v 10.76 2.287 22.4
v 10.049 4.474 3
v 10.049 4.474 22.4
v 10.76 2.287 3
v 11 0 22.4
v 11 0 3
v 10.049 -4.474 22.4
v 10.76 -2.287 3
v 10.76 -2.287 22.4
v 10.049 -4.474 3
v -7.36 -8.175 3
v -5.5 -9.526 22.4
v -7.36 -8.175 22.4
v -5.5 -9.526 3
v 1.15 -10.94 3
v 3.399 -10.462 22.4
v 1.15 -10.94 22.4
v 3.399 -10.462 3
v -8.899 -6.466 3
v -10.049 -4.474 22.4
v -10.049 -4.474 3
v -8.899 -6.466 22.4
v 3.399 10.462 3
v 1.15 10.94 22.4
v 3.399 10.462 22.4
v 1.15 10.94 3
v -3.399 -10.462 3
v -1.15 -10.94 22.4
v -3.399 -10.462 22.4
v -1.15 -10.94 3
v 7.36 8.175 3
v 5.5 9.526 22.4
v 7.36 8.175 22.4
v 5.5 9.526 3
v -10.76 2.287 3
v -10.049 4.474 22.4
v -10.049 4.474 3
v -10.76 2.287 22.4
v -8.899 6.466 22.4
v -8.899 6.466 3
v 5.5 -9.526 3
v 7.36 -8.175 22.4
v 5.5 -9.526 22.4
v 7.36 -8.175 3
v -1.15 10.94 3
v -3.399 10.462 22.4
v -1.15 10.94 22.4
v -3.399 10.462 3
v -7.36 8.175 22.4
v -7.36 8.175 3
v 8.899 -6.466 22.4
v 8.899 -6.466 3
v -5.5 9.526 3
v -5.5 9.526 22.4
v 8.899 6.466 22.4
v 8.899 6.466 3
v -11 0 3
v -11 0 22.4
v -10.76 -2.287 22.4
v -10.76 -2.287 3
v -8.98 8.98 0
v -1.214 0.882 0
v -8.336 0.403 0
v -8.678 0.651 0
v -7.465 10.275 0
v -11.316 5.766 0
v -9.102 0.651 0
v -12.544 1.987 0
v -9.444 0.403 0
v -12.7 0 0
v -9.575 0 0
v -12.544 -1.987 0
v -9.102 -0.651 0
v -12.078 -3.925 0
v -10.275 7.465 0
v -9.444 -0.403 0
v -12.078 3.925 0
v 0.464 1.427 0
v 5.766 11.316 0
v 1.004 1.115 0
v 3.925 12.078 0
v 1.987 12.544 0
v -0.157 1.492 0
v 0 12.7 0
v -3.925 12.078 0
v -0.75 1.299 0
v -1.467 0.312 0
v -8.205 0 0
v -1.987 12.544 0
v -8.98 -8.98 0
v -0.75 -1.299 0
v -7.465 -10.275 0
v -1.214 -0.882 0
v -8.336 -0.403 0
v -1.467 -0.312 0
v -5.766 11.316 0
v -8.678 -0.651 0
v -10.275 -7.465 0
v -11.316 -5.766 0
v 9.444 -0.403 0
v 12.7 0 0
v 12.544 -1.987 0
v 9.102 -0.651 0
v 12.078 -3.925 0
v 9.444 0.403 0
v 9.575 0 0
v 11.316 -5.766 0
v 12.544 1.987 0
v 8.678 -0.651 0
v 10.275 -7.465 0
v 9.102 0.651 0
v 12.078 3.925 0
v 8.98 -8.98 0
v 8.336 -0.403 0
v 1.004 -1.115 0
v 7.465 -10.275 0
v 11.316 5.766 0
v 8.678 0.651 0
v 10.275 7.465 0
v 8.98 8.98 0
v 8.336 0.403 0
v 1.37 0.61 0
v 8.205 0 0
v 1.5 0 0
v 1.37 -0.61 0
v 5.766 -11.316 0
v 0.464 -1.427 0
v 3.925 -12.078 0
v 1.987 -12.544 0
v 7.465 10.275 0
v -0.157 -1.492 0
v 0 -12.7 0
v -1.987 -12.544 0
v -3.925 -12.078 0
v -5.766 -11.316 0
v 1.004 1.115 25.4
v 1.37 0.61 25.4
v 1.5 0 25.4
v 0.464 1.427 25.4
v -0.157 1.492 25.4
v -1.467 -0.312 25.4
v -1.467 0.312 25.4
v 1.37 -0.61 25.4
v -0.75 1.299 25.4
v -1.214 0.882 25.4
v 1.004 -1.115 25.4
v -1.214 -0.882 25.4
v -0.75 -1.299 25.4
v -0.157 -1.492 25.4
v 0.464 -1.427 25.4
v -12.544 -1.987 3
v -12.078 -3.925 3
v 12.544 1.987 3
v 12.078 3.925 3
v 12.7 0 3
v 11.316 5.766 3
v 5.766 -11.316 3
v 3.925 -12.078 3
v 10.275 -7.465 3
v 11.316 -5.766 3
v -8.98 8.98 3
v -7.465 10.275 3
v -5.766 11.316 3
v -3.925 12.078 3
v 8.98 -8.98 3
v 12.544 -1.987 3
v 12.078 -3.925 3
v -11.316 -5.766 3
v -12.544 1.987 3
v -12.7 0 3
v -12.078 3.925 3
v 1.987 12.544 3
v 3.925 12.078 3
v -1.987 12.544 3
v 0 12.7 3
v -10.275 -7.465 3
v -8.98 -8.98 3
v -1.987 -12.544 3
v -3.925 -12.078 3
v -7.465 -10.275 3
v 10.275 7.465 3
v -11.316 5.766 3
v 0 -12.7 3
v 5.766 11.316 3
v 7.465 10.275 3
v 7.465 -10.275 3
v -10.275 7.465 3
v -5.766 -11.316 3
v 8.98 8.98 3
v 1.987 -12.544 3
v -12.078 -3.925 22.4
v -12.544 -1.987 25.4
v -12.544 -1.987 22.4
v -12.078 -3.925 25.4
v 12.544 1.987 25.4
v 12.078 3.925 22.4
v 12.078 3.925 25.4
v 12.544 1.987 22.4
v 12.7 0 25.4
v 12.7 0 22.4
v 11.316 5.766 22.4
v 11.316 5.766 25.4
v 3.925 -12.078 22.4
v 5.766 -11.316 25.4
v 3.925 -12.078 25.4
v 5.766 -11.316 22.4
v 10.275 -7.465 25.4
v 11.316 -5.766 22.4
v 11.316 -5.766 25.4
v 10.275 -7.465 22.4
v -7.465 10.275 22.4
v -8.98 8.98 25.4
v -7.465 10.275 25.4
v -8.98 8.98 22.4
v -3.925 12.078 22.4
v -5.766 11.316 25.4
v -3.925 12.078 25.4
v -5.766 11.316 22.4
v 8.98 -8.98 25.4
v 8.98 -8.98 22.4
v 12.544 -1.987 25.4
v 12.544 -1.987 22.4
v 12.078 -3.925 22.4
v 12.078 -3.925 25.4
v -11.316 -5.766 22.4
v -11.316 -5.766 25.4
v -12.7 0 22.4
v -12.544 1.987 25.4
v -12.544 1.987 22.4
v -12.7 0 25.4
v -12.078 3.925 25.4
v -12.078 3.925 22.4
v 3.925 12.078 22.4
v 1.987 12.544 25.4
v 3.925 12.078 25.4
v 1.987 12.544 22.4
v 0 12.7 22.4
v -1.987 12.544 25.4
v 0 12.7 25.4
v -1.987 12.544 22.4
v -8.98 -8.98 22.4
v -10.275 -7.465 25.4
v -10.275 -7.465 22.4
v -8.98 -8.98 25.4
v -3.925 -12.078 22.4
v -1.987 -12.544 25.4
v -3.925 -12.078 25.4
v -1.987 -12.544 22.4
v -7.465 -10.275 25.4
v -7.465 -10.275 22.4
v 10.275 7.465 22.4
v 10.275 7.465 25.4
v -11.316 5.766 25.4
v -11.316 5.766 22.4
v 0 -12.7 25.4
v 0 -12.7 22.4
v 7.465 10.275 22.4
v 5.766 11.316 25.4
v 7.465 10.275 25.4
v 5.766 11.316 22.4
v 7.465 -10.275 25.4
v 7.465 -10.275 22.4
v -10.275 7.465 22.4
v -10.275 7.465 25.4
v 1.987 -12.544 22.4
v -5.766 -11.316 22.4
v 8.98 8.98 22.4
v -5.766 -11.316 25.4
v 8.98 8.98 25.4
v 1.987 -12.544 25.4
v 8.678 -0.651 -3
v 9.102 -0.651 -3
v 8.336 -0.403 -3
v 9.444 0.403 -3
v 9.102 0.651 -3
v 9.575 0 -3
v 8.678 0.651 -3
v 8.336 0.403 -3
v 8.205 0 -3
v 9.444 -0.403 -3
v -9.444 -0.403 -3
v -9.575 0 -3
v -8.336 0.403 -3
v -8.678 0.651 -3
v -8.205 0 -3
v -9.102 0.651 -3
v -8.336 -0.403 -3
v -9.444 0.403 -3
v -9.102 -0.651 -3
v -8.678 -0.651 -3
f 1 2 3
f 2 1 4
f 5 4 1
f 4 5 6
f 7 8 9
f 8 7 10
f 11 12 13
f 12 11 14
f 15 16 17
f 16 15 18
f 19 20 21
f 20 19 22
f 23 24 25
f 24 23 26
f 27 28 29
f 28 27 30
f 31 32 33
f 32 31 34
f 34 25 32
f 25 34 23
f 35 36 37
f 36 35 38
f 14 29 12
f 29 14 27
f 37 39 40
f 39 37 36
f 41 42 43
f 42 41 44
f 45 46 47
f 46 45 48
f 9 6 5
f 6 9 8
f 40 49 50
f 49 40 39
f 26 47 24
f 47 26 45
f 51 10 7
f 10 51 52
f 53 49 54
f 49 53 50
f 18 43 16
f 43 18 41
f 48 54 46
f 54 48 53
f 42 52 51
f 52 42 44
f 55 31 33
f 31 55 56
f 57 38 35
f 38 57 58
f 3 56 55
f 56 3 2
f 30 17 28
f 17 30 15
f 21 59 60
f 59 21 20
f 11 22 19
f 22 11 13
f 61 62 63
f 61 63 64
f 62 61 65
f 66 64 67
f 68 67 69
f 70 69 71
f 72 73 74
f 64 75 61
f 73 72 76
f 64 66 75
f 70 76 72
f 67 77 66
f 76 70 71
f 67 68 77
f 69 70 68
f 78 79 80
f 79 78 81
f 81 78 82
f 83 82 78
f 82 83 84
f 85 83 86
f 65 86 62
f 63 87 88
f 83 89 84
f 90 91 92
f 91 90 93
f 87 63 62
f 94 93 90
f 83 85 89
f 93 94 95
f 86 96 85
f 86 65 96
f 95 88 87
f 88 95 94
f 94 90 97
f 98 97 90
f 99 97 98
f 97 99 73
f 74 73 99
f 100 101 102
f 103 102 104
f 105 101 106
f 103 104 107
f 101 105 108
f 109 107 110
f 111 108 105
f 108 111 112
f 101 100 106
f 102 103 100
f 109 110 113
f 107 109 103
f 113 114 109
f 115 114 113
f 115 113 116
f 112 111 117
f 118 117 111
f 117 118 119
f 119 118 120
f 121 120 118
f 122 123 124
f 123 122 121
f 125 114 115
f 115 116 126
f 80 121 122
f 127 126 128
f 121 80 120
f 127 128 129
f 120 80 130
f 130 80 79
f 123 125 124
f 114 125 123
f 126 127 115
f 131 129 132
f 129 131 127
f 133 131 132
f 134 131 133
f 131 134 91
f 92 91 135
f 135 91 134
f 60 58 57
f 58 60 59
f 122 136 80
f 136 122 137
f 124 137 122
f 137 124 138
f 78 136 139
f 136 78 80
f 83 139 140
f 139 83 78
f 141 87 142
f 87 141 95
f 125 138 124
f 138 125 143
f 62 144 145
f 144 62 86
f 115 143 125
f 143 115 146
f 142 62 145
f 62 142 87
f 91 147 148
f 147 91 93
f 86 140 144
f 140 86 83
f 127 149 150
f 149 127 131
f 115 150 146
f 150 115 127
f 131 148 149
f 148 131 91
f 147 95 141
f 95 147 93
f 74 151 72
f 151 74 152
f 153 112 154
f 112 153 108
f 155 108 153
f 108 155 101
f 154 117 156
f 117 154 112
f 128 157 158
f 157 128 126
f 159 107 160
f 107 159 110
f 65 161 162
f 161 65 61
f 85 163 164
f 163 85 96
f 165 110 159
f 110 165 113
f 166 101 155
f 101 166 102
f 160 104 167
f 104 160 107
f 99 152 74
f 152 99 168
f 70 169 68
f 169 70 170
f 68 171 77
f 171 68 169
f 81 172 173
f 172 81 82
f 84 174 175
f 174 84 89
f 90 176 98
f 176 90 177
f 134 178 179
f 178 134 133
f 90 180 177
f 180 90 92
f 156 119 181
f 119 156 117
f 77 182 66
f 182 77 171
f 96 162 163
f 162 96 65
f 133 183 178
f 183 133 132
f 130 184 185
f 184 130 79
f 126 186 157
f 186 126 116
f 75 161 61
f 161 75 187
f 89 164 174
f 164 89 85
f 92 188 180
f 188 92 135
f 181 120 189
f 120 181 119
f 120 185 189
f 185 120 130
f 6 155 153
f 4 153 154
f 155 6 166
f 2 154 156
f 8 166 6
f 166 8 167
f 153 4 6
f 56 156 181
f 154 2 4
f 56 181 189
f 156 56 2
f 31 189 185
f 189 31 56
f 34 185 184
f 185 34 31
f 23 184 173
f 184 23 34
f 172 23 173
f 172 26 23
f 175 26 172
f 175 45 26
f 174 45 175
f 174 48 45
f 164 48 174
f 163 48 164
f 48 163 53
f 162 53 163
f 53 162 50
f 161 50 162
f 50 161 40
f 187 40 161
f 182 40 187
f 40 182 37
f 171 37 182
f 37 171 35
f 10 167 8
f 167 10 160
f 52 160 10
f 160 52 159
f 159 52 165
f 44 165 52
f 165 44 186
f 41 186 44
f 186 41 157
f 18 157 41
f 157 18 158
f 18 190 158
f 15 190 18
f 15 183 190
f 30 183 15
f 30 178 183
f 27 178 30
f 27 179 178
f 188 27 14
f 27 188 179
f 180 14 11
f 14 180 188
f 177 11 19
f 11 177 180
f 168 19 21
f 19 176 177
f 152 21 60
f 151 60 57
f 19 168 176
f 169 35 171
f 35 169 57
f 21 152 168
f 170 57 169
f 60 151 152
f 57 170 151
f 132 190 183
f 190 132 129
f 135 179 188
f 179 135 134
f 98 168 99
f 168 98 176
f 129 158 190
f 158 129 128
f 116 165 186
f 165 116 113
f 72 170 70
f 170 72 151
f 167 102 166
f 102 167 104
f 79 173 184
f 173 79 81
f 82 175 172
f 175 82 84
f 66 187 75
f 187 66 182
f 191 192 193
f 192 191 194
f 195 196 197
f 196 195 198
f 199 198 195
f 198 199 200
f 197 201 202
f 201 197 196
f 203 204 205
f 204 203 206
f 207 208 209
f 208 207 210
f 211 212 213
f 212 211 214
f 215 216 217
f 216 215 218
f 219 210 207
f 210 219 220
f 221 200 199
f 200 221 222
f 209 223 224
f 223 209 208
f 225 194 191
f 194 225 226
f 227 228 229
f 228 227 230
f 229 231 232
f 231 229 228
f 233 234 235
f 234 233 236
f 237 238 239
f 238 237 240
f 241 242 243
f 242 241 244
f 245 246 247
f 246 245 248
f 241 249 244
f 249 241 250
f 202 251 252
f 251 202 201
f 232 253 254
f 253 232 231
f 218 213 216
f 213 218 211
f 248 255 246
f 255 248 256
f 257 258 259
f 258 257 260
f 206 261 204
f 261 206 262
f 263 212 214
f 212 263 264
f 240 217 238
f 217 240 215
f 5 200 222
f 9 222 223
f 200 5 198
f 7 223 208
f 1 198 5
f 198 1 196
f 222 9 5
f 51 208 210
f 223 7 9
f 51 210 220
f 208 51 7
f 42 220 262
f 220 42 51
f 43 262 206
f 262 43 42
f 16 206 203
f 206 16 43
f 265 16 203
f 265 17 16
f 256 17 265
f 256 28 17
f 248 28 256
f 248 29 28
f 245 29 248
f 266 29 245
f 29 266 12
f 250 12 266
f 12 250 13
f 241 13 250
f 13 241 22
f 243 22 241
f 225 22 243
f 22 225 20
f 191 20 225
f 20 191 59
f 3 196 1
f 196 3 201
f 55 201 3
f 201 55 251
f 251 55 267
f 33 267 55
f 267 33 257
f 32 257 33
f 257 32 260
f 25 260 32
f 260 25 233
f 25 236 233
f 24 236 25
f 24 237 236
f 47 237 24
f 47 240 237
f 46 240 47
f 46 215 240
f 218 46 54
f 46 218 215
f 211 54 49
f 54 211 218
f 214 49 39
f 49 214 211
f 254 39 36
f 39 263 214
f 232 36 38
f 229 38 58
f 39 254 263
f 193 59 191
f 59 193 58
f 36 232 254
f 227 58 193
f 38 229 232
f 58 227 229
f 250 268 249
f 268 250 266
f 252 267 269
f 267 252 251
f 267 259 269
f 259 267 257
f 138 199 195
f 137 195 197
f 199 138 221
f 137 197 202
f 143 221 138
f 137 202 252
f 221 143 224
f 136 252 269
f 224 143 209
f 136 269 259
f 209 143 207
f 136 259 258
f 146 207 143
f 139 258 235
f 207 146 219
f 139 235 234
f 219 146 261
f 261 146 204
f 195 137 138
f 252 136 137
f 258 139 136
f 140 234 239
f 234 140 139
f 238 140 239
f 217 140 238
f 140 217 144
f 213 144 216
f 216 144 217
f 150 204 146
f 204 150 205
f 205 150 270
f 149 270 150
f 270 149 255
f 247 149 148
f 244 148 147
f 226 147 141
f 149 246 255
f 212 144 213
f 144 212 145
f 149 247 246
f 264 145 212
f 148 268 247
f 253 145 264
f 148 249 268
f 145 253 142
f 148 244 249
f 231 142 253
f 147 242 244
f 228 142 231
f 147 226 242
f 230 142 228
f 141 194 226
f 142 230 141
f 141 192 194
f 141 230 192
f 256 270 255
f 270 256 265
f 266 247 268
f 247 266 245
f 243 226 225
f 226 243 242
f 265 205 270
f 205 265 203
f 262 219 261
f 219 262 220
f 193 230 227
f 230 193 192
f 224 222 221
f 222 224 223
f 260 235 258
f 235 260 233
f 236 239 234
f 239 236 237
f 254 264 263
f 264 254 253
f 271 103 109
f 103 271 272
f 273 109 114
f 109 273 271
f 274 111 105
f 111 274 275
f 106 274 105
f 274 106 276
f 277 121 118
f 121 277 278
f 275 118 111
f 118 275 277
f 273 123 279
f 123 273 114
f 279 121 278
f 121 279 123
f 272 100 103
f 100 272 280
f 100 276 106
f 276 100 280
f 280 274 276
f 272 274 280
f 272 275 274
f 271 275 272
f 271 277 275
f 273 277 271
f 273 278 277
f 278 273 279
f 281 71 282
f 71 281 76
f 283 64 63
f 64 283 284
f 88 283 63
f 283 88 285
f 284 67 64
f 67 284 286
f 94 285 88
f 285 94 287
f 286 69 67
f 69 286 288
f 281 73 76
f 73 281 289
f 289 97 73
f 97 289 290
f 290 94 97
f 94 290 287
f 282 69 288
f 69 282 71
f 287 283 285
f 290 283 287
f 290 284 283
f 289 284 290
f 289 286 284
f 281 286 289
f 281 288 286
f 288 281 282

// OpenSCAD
difference(){
  color("RosyBrown")cylinder(d=22,h=25,$fn=30);
  cylinder(d=3,h=27,$fn=15);
}
color("Black")difference(){
color("Black")cylinder(d=25.4,h=3,$fn=40);
  cylinder(d=3,h=27,$fn=15);
}
color("Black")difference(){
color("Black")translate([0,0,25.4-3])cylinder(d=25.4,h=3,$fn=40);
  cylinder(d=3,h=27,$fn=15);
}

color("Silver")translate([17.78/2,0,-3])cylinder(d=1.37,h=5,$fn=10);
color("Silver")translate([-17.78/2,0,-3])cylinder(d=1.37,h=5,$fn=10);
